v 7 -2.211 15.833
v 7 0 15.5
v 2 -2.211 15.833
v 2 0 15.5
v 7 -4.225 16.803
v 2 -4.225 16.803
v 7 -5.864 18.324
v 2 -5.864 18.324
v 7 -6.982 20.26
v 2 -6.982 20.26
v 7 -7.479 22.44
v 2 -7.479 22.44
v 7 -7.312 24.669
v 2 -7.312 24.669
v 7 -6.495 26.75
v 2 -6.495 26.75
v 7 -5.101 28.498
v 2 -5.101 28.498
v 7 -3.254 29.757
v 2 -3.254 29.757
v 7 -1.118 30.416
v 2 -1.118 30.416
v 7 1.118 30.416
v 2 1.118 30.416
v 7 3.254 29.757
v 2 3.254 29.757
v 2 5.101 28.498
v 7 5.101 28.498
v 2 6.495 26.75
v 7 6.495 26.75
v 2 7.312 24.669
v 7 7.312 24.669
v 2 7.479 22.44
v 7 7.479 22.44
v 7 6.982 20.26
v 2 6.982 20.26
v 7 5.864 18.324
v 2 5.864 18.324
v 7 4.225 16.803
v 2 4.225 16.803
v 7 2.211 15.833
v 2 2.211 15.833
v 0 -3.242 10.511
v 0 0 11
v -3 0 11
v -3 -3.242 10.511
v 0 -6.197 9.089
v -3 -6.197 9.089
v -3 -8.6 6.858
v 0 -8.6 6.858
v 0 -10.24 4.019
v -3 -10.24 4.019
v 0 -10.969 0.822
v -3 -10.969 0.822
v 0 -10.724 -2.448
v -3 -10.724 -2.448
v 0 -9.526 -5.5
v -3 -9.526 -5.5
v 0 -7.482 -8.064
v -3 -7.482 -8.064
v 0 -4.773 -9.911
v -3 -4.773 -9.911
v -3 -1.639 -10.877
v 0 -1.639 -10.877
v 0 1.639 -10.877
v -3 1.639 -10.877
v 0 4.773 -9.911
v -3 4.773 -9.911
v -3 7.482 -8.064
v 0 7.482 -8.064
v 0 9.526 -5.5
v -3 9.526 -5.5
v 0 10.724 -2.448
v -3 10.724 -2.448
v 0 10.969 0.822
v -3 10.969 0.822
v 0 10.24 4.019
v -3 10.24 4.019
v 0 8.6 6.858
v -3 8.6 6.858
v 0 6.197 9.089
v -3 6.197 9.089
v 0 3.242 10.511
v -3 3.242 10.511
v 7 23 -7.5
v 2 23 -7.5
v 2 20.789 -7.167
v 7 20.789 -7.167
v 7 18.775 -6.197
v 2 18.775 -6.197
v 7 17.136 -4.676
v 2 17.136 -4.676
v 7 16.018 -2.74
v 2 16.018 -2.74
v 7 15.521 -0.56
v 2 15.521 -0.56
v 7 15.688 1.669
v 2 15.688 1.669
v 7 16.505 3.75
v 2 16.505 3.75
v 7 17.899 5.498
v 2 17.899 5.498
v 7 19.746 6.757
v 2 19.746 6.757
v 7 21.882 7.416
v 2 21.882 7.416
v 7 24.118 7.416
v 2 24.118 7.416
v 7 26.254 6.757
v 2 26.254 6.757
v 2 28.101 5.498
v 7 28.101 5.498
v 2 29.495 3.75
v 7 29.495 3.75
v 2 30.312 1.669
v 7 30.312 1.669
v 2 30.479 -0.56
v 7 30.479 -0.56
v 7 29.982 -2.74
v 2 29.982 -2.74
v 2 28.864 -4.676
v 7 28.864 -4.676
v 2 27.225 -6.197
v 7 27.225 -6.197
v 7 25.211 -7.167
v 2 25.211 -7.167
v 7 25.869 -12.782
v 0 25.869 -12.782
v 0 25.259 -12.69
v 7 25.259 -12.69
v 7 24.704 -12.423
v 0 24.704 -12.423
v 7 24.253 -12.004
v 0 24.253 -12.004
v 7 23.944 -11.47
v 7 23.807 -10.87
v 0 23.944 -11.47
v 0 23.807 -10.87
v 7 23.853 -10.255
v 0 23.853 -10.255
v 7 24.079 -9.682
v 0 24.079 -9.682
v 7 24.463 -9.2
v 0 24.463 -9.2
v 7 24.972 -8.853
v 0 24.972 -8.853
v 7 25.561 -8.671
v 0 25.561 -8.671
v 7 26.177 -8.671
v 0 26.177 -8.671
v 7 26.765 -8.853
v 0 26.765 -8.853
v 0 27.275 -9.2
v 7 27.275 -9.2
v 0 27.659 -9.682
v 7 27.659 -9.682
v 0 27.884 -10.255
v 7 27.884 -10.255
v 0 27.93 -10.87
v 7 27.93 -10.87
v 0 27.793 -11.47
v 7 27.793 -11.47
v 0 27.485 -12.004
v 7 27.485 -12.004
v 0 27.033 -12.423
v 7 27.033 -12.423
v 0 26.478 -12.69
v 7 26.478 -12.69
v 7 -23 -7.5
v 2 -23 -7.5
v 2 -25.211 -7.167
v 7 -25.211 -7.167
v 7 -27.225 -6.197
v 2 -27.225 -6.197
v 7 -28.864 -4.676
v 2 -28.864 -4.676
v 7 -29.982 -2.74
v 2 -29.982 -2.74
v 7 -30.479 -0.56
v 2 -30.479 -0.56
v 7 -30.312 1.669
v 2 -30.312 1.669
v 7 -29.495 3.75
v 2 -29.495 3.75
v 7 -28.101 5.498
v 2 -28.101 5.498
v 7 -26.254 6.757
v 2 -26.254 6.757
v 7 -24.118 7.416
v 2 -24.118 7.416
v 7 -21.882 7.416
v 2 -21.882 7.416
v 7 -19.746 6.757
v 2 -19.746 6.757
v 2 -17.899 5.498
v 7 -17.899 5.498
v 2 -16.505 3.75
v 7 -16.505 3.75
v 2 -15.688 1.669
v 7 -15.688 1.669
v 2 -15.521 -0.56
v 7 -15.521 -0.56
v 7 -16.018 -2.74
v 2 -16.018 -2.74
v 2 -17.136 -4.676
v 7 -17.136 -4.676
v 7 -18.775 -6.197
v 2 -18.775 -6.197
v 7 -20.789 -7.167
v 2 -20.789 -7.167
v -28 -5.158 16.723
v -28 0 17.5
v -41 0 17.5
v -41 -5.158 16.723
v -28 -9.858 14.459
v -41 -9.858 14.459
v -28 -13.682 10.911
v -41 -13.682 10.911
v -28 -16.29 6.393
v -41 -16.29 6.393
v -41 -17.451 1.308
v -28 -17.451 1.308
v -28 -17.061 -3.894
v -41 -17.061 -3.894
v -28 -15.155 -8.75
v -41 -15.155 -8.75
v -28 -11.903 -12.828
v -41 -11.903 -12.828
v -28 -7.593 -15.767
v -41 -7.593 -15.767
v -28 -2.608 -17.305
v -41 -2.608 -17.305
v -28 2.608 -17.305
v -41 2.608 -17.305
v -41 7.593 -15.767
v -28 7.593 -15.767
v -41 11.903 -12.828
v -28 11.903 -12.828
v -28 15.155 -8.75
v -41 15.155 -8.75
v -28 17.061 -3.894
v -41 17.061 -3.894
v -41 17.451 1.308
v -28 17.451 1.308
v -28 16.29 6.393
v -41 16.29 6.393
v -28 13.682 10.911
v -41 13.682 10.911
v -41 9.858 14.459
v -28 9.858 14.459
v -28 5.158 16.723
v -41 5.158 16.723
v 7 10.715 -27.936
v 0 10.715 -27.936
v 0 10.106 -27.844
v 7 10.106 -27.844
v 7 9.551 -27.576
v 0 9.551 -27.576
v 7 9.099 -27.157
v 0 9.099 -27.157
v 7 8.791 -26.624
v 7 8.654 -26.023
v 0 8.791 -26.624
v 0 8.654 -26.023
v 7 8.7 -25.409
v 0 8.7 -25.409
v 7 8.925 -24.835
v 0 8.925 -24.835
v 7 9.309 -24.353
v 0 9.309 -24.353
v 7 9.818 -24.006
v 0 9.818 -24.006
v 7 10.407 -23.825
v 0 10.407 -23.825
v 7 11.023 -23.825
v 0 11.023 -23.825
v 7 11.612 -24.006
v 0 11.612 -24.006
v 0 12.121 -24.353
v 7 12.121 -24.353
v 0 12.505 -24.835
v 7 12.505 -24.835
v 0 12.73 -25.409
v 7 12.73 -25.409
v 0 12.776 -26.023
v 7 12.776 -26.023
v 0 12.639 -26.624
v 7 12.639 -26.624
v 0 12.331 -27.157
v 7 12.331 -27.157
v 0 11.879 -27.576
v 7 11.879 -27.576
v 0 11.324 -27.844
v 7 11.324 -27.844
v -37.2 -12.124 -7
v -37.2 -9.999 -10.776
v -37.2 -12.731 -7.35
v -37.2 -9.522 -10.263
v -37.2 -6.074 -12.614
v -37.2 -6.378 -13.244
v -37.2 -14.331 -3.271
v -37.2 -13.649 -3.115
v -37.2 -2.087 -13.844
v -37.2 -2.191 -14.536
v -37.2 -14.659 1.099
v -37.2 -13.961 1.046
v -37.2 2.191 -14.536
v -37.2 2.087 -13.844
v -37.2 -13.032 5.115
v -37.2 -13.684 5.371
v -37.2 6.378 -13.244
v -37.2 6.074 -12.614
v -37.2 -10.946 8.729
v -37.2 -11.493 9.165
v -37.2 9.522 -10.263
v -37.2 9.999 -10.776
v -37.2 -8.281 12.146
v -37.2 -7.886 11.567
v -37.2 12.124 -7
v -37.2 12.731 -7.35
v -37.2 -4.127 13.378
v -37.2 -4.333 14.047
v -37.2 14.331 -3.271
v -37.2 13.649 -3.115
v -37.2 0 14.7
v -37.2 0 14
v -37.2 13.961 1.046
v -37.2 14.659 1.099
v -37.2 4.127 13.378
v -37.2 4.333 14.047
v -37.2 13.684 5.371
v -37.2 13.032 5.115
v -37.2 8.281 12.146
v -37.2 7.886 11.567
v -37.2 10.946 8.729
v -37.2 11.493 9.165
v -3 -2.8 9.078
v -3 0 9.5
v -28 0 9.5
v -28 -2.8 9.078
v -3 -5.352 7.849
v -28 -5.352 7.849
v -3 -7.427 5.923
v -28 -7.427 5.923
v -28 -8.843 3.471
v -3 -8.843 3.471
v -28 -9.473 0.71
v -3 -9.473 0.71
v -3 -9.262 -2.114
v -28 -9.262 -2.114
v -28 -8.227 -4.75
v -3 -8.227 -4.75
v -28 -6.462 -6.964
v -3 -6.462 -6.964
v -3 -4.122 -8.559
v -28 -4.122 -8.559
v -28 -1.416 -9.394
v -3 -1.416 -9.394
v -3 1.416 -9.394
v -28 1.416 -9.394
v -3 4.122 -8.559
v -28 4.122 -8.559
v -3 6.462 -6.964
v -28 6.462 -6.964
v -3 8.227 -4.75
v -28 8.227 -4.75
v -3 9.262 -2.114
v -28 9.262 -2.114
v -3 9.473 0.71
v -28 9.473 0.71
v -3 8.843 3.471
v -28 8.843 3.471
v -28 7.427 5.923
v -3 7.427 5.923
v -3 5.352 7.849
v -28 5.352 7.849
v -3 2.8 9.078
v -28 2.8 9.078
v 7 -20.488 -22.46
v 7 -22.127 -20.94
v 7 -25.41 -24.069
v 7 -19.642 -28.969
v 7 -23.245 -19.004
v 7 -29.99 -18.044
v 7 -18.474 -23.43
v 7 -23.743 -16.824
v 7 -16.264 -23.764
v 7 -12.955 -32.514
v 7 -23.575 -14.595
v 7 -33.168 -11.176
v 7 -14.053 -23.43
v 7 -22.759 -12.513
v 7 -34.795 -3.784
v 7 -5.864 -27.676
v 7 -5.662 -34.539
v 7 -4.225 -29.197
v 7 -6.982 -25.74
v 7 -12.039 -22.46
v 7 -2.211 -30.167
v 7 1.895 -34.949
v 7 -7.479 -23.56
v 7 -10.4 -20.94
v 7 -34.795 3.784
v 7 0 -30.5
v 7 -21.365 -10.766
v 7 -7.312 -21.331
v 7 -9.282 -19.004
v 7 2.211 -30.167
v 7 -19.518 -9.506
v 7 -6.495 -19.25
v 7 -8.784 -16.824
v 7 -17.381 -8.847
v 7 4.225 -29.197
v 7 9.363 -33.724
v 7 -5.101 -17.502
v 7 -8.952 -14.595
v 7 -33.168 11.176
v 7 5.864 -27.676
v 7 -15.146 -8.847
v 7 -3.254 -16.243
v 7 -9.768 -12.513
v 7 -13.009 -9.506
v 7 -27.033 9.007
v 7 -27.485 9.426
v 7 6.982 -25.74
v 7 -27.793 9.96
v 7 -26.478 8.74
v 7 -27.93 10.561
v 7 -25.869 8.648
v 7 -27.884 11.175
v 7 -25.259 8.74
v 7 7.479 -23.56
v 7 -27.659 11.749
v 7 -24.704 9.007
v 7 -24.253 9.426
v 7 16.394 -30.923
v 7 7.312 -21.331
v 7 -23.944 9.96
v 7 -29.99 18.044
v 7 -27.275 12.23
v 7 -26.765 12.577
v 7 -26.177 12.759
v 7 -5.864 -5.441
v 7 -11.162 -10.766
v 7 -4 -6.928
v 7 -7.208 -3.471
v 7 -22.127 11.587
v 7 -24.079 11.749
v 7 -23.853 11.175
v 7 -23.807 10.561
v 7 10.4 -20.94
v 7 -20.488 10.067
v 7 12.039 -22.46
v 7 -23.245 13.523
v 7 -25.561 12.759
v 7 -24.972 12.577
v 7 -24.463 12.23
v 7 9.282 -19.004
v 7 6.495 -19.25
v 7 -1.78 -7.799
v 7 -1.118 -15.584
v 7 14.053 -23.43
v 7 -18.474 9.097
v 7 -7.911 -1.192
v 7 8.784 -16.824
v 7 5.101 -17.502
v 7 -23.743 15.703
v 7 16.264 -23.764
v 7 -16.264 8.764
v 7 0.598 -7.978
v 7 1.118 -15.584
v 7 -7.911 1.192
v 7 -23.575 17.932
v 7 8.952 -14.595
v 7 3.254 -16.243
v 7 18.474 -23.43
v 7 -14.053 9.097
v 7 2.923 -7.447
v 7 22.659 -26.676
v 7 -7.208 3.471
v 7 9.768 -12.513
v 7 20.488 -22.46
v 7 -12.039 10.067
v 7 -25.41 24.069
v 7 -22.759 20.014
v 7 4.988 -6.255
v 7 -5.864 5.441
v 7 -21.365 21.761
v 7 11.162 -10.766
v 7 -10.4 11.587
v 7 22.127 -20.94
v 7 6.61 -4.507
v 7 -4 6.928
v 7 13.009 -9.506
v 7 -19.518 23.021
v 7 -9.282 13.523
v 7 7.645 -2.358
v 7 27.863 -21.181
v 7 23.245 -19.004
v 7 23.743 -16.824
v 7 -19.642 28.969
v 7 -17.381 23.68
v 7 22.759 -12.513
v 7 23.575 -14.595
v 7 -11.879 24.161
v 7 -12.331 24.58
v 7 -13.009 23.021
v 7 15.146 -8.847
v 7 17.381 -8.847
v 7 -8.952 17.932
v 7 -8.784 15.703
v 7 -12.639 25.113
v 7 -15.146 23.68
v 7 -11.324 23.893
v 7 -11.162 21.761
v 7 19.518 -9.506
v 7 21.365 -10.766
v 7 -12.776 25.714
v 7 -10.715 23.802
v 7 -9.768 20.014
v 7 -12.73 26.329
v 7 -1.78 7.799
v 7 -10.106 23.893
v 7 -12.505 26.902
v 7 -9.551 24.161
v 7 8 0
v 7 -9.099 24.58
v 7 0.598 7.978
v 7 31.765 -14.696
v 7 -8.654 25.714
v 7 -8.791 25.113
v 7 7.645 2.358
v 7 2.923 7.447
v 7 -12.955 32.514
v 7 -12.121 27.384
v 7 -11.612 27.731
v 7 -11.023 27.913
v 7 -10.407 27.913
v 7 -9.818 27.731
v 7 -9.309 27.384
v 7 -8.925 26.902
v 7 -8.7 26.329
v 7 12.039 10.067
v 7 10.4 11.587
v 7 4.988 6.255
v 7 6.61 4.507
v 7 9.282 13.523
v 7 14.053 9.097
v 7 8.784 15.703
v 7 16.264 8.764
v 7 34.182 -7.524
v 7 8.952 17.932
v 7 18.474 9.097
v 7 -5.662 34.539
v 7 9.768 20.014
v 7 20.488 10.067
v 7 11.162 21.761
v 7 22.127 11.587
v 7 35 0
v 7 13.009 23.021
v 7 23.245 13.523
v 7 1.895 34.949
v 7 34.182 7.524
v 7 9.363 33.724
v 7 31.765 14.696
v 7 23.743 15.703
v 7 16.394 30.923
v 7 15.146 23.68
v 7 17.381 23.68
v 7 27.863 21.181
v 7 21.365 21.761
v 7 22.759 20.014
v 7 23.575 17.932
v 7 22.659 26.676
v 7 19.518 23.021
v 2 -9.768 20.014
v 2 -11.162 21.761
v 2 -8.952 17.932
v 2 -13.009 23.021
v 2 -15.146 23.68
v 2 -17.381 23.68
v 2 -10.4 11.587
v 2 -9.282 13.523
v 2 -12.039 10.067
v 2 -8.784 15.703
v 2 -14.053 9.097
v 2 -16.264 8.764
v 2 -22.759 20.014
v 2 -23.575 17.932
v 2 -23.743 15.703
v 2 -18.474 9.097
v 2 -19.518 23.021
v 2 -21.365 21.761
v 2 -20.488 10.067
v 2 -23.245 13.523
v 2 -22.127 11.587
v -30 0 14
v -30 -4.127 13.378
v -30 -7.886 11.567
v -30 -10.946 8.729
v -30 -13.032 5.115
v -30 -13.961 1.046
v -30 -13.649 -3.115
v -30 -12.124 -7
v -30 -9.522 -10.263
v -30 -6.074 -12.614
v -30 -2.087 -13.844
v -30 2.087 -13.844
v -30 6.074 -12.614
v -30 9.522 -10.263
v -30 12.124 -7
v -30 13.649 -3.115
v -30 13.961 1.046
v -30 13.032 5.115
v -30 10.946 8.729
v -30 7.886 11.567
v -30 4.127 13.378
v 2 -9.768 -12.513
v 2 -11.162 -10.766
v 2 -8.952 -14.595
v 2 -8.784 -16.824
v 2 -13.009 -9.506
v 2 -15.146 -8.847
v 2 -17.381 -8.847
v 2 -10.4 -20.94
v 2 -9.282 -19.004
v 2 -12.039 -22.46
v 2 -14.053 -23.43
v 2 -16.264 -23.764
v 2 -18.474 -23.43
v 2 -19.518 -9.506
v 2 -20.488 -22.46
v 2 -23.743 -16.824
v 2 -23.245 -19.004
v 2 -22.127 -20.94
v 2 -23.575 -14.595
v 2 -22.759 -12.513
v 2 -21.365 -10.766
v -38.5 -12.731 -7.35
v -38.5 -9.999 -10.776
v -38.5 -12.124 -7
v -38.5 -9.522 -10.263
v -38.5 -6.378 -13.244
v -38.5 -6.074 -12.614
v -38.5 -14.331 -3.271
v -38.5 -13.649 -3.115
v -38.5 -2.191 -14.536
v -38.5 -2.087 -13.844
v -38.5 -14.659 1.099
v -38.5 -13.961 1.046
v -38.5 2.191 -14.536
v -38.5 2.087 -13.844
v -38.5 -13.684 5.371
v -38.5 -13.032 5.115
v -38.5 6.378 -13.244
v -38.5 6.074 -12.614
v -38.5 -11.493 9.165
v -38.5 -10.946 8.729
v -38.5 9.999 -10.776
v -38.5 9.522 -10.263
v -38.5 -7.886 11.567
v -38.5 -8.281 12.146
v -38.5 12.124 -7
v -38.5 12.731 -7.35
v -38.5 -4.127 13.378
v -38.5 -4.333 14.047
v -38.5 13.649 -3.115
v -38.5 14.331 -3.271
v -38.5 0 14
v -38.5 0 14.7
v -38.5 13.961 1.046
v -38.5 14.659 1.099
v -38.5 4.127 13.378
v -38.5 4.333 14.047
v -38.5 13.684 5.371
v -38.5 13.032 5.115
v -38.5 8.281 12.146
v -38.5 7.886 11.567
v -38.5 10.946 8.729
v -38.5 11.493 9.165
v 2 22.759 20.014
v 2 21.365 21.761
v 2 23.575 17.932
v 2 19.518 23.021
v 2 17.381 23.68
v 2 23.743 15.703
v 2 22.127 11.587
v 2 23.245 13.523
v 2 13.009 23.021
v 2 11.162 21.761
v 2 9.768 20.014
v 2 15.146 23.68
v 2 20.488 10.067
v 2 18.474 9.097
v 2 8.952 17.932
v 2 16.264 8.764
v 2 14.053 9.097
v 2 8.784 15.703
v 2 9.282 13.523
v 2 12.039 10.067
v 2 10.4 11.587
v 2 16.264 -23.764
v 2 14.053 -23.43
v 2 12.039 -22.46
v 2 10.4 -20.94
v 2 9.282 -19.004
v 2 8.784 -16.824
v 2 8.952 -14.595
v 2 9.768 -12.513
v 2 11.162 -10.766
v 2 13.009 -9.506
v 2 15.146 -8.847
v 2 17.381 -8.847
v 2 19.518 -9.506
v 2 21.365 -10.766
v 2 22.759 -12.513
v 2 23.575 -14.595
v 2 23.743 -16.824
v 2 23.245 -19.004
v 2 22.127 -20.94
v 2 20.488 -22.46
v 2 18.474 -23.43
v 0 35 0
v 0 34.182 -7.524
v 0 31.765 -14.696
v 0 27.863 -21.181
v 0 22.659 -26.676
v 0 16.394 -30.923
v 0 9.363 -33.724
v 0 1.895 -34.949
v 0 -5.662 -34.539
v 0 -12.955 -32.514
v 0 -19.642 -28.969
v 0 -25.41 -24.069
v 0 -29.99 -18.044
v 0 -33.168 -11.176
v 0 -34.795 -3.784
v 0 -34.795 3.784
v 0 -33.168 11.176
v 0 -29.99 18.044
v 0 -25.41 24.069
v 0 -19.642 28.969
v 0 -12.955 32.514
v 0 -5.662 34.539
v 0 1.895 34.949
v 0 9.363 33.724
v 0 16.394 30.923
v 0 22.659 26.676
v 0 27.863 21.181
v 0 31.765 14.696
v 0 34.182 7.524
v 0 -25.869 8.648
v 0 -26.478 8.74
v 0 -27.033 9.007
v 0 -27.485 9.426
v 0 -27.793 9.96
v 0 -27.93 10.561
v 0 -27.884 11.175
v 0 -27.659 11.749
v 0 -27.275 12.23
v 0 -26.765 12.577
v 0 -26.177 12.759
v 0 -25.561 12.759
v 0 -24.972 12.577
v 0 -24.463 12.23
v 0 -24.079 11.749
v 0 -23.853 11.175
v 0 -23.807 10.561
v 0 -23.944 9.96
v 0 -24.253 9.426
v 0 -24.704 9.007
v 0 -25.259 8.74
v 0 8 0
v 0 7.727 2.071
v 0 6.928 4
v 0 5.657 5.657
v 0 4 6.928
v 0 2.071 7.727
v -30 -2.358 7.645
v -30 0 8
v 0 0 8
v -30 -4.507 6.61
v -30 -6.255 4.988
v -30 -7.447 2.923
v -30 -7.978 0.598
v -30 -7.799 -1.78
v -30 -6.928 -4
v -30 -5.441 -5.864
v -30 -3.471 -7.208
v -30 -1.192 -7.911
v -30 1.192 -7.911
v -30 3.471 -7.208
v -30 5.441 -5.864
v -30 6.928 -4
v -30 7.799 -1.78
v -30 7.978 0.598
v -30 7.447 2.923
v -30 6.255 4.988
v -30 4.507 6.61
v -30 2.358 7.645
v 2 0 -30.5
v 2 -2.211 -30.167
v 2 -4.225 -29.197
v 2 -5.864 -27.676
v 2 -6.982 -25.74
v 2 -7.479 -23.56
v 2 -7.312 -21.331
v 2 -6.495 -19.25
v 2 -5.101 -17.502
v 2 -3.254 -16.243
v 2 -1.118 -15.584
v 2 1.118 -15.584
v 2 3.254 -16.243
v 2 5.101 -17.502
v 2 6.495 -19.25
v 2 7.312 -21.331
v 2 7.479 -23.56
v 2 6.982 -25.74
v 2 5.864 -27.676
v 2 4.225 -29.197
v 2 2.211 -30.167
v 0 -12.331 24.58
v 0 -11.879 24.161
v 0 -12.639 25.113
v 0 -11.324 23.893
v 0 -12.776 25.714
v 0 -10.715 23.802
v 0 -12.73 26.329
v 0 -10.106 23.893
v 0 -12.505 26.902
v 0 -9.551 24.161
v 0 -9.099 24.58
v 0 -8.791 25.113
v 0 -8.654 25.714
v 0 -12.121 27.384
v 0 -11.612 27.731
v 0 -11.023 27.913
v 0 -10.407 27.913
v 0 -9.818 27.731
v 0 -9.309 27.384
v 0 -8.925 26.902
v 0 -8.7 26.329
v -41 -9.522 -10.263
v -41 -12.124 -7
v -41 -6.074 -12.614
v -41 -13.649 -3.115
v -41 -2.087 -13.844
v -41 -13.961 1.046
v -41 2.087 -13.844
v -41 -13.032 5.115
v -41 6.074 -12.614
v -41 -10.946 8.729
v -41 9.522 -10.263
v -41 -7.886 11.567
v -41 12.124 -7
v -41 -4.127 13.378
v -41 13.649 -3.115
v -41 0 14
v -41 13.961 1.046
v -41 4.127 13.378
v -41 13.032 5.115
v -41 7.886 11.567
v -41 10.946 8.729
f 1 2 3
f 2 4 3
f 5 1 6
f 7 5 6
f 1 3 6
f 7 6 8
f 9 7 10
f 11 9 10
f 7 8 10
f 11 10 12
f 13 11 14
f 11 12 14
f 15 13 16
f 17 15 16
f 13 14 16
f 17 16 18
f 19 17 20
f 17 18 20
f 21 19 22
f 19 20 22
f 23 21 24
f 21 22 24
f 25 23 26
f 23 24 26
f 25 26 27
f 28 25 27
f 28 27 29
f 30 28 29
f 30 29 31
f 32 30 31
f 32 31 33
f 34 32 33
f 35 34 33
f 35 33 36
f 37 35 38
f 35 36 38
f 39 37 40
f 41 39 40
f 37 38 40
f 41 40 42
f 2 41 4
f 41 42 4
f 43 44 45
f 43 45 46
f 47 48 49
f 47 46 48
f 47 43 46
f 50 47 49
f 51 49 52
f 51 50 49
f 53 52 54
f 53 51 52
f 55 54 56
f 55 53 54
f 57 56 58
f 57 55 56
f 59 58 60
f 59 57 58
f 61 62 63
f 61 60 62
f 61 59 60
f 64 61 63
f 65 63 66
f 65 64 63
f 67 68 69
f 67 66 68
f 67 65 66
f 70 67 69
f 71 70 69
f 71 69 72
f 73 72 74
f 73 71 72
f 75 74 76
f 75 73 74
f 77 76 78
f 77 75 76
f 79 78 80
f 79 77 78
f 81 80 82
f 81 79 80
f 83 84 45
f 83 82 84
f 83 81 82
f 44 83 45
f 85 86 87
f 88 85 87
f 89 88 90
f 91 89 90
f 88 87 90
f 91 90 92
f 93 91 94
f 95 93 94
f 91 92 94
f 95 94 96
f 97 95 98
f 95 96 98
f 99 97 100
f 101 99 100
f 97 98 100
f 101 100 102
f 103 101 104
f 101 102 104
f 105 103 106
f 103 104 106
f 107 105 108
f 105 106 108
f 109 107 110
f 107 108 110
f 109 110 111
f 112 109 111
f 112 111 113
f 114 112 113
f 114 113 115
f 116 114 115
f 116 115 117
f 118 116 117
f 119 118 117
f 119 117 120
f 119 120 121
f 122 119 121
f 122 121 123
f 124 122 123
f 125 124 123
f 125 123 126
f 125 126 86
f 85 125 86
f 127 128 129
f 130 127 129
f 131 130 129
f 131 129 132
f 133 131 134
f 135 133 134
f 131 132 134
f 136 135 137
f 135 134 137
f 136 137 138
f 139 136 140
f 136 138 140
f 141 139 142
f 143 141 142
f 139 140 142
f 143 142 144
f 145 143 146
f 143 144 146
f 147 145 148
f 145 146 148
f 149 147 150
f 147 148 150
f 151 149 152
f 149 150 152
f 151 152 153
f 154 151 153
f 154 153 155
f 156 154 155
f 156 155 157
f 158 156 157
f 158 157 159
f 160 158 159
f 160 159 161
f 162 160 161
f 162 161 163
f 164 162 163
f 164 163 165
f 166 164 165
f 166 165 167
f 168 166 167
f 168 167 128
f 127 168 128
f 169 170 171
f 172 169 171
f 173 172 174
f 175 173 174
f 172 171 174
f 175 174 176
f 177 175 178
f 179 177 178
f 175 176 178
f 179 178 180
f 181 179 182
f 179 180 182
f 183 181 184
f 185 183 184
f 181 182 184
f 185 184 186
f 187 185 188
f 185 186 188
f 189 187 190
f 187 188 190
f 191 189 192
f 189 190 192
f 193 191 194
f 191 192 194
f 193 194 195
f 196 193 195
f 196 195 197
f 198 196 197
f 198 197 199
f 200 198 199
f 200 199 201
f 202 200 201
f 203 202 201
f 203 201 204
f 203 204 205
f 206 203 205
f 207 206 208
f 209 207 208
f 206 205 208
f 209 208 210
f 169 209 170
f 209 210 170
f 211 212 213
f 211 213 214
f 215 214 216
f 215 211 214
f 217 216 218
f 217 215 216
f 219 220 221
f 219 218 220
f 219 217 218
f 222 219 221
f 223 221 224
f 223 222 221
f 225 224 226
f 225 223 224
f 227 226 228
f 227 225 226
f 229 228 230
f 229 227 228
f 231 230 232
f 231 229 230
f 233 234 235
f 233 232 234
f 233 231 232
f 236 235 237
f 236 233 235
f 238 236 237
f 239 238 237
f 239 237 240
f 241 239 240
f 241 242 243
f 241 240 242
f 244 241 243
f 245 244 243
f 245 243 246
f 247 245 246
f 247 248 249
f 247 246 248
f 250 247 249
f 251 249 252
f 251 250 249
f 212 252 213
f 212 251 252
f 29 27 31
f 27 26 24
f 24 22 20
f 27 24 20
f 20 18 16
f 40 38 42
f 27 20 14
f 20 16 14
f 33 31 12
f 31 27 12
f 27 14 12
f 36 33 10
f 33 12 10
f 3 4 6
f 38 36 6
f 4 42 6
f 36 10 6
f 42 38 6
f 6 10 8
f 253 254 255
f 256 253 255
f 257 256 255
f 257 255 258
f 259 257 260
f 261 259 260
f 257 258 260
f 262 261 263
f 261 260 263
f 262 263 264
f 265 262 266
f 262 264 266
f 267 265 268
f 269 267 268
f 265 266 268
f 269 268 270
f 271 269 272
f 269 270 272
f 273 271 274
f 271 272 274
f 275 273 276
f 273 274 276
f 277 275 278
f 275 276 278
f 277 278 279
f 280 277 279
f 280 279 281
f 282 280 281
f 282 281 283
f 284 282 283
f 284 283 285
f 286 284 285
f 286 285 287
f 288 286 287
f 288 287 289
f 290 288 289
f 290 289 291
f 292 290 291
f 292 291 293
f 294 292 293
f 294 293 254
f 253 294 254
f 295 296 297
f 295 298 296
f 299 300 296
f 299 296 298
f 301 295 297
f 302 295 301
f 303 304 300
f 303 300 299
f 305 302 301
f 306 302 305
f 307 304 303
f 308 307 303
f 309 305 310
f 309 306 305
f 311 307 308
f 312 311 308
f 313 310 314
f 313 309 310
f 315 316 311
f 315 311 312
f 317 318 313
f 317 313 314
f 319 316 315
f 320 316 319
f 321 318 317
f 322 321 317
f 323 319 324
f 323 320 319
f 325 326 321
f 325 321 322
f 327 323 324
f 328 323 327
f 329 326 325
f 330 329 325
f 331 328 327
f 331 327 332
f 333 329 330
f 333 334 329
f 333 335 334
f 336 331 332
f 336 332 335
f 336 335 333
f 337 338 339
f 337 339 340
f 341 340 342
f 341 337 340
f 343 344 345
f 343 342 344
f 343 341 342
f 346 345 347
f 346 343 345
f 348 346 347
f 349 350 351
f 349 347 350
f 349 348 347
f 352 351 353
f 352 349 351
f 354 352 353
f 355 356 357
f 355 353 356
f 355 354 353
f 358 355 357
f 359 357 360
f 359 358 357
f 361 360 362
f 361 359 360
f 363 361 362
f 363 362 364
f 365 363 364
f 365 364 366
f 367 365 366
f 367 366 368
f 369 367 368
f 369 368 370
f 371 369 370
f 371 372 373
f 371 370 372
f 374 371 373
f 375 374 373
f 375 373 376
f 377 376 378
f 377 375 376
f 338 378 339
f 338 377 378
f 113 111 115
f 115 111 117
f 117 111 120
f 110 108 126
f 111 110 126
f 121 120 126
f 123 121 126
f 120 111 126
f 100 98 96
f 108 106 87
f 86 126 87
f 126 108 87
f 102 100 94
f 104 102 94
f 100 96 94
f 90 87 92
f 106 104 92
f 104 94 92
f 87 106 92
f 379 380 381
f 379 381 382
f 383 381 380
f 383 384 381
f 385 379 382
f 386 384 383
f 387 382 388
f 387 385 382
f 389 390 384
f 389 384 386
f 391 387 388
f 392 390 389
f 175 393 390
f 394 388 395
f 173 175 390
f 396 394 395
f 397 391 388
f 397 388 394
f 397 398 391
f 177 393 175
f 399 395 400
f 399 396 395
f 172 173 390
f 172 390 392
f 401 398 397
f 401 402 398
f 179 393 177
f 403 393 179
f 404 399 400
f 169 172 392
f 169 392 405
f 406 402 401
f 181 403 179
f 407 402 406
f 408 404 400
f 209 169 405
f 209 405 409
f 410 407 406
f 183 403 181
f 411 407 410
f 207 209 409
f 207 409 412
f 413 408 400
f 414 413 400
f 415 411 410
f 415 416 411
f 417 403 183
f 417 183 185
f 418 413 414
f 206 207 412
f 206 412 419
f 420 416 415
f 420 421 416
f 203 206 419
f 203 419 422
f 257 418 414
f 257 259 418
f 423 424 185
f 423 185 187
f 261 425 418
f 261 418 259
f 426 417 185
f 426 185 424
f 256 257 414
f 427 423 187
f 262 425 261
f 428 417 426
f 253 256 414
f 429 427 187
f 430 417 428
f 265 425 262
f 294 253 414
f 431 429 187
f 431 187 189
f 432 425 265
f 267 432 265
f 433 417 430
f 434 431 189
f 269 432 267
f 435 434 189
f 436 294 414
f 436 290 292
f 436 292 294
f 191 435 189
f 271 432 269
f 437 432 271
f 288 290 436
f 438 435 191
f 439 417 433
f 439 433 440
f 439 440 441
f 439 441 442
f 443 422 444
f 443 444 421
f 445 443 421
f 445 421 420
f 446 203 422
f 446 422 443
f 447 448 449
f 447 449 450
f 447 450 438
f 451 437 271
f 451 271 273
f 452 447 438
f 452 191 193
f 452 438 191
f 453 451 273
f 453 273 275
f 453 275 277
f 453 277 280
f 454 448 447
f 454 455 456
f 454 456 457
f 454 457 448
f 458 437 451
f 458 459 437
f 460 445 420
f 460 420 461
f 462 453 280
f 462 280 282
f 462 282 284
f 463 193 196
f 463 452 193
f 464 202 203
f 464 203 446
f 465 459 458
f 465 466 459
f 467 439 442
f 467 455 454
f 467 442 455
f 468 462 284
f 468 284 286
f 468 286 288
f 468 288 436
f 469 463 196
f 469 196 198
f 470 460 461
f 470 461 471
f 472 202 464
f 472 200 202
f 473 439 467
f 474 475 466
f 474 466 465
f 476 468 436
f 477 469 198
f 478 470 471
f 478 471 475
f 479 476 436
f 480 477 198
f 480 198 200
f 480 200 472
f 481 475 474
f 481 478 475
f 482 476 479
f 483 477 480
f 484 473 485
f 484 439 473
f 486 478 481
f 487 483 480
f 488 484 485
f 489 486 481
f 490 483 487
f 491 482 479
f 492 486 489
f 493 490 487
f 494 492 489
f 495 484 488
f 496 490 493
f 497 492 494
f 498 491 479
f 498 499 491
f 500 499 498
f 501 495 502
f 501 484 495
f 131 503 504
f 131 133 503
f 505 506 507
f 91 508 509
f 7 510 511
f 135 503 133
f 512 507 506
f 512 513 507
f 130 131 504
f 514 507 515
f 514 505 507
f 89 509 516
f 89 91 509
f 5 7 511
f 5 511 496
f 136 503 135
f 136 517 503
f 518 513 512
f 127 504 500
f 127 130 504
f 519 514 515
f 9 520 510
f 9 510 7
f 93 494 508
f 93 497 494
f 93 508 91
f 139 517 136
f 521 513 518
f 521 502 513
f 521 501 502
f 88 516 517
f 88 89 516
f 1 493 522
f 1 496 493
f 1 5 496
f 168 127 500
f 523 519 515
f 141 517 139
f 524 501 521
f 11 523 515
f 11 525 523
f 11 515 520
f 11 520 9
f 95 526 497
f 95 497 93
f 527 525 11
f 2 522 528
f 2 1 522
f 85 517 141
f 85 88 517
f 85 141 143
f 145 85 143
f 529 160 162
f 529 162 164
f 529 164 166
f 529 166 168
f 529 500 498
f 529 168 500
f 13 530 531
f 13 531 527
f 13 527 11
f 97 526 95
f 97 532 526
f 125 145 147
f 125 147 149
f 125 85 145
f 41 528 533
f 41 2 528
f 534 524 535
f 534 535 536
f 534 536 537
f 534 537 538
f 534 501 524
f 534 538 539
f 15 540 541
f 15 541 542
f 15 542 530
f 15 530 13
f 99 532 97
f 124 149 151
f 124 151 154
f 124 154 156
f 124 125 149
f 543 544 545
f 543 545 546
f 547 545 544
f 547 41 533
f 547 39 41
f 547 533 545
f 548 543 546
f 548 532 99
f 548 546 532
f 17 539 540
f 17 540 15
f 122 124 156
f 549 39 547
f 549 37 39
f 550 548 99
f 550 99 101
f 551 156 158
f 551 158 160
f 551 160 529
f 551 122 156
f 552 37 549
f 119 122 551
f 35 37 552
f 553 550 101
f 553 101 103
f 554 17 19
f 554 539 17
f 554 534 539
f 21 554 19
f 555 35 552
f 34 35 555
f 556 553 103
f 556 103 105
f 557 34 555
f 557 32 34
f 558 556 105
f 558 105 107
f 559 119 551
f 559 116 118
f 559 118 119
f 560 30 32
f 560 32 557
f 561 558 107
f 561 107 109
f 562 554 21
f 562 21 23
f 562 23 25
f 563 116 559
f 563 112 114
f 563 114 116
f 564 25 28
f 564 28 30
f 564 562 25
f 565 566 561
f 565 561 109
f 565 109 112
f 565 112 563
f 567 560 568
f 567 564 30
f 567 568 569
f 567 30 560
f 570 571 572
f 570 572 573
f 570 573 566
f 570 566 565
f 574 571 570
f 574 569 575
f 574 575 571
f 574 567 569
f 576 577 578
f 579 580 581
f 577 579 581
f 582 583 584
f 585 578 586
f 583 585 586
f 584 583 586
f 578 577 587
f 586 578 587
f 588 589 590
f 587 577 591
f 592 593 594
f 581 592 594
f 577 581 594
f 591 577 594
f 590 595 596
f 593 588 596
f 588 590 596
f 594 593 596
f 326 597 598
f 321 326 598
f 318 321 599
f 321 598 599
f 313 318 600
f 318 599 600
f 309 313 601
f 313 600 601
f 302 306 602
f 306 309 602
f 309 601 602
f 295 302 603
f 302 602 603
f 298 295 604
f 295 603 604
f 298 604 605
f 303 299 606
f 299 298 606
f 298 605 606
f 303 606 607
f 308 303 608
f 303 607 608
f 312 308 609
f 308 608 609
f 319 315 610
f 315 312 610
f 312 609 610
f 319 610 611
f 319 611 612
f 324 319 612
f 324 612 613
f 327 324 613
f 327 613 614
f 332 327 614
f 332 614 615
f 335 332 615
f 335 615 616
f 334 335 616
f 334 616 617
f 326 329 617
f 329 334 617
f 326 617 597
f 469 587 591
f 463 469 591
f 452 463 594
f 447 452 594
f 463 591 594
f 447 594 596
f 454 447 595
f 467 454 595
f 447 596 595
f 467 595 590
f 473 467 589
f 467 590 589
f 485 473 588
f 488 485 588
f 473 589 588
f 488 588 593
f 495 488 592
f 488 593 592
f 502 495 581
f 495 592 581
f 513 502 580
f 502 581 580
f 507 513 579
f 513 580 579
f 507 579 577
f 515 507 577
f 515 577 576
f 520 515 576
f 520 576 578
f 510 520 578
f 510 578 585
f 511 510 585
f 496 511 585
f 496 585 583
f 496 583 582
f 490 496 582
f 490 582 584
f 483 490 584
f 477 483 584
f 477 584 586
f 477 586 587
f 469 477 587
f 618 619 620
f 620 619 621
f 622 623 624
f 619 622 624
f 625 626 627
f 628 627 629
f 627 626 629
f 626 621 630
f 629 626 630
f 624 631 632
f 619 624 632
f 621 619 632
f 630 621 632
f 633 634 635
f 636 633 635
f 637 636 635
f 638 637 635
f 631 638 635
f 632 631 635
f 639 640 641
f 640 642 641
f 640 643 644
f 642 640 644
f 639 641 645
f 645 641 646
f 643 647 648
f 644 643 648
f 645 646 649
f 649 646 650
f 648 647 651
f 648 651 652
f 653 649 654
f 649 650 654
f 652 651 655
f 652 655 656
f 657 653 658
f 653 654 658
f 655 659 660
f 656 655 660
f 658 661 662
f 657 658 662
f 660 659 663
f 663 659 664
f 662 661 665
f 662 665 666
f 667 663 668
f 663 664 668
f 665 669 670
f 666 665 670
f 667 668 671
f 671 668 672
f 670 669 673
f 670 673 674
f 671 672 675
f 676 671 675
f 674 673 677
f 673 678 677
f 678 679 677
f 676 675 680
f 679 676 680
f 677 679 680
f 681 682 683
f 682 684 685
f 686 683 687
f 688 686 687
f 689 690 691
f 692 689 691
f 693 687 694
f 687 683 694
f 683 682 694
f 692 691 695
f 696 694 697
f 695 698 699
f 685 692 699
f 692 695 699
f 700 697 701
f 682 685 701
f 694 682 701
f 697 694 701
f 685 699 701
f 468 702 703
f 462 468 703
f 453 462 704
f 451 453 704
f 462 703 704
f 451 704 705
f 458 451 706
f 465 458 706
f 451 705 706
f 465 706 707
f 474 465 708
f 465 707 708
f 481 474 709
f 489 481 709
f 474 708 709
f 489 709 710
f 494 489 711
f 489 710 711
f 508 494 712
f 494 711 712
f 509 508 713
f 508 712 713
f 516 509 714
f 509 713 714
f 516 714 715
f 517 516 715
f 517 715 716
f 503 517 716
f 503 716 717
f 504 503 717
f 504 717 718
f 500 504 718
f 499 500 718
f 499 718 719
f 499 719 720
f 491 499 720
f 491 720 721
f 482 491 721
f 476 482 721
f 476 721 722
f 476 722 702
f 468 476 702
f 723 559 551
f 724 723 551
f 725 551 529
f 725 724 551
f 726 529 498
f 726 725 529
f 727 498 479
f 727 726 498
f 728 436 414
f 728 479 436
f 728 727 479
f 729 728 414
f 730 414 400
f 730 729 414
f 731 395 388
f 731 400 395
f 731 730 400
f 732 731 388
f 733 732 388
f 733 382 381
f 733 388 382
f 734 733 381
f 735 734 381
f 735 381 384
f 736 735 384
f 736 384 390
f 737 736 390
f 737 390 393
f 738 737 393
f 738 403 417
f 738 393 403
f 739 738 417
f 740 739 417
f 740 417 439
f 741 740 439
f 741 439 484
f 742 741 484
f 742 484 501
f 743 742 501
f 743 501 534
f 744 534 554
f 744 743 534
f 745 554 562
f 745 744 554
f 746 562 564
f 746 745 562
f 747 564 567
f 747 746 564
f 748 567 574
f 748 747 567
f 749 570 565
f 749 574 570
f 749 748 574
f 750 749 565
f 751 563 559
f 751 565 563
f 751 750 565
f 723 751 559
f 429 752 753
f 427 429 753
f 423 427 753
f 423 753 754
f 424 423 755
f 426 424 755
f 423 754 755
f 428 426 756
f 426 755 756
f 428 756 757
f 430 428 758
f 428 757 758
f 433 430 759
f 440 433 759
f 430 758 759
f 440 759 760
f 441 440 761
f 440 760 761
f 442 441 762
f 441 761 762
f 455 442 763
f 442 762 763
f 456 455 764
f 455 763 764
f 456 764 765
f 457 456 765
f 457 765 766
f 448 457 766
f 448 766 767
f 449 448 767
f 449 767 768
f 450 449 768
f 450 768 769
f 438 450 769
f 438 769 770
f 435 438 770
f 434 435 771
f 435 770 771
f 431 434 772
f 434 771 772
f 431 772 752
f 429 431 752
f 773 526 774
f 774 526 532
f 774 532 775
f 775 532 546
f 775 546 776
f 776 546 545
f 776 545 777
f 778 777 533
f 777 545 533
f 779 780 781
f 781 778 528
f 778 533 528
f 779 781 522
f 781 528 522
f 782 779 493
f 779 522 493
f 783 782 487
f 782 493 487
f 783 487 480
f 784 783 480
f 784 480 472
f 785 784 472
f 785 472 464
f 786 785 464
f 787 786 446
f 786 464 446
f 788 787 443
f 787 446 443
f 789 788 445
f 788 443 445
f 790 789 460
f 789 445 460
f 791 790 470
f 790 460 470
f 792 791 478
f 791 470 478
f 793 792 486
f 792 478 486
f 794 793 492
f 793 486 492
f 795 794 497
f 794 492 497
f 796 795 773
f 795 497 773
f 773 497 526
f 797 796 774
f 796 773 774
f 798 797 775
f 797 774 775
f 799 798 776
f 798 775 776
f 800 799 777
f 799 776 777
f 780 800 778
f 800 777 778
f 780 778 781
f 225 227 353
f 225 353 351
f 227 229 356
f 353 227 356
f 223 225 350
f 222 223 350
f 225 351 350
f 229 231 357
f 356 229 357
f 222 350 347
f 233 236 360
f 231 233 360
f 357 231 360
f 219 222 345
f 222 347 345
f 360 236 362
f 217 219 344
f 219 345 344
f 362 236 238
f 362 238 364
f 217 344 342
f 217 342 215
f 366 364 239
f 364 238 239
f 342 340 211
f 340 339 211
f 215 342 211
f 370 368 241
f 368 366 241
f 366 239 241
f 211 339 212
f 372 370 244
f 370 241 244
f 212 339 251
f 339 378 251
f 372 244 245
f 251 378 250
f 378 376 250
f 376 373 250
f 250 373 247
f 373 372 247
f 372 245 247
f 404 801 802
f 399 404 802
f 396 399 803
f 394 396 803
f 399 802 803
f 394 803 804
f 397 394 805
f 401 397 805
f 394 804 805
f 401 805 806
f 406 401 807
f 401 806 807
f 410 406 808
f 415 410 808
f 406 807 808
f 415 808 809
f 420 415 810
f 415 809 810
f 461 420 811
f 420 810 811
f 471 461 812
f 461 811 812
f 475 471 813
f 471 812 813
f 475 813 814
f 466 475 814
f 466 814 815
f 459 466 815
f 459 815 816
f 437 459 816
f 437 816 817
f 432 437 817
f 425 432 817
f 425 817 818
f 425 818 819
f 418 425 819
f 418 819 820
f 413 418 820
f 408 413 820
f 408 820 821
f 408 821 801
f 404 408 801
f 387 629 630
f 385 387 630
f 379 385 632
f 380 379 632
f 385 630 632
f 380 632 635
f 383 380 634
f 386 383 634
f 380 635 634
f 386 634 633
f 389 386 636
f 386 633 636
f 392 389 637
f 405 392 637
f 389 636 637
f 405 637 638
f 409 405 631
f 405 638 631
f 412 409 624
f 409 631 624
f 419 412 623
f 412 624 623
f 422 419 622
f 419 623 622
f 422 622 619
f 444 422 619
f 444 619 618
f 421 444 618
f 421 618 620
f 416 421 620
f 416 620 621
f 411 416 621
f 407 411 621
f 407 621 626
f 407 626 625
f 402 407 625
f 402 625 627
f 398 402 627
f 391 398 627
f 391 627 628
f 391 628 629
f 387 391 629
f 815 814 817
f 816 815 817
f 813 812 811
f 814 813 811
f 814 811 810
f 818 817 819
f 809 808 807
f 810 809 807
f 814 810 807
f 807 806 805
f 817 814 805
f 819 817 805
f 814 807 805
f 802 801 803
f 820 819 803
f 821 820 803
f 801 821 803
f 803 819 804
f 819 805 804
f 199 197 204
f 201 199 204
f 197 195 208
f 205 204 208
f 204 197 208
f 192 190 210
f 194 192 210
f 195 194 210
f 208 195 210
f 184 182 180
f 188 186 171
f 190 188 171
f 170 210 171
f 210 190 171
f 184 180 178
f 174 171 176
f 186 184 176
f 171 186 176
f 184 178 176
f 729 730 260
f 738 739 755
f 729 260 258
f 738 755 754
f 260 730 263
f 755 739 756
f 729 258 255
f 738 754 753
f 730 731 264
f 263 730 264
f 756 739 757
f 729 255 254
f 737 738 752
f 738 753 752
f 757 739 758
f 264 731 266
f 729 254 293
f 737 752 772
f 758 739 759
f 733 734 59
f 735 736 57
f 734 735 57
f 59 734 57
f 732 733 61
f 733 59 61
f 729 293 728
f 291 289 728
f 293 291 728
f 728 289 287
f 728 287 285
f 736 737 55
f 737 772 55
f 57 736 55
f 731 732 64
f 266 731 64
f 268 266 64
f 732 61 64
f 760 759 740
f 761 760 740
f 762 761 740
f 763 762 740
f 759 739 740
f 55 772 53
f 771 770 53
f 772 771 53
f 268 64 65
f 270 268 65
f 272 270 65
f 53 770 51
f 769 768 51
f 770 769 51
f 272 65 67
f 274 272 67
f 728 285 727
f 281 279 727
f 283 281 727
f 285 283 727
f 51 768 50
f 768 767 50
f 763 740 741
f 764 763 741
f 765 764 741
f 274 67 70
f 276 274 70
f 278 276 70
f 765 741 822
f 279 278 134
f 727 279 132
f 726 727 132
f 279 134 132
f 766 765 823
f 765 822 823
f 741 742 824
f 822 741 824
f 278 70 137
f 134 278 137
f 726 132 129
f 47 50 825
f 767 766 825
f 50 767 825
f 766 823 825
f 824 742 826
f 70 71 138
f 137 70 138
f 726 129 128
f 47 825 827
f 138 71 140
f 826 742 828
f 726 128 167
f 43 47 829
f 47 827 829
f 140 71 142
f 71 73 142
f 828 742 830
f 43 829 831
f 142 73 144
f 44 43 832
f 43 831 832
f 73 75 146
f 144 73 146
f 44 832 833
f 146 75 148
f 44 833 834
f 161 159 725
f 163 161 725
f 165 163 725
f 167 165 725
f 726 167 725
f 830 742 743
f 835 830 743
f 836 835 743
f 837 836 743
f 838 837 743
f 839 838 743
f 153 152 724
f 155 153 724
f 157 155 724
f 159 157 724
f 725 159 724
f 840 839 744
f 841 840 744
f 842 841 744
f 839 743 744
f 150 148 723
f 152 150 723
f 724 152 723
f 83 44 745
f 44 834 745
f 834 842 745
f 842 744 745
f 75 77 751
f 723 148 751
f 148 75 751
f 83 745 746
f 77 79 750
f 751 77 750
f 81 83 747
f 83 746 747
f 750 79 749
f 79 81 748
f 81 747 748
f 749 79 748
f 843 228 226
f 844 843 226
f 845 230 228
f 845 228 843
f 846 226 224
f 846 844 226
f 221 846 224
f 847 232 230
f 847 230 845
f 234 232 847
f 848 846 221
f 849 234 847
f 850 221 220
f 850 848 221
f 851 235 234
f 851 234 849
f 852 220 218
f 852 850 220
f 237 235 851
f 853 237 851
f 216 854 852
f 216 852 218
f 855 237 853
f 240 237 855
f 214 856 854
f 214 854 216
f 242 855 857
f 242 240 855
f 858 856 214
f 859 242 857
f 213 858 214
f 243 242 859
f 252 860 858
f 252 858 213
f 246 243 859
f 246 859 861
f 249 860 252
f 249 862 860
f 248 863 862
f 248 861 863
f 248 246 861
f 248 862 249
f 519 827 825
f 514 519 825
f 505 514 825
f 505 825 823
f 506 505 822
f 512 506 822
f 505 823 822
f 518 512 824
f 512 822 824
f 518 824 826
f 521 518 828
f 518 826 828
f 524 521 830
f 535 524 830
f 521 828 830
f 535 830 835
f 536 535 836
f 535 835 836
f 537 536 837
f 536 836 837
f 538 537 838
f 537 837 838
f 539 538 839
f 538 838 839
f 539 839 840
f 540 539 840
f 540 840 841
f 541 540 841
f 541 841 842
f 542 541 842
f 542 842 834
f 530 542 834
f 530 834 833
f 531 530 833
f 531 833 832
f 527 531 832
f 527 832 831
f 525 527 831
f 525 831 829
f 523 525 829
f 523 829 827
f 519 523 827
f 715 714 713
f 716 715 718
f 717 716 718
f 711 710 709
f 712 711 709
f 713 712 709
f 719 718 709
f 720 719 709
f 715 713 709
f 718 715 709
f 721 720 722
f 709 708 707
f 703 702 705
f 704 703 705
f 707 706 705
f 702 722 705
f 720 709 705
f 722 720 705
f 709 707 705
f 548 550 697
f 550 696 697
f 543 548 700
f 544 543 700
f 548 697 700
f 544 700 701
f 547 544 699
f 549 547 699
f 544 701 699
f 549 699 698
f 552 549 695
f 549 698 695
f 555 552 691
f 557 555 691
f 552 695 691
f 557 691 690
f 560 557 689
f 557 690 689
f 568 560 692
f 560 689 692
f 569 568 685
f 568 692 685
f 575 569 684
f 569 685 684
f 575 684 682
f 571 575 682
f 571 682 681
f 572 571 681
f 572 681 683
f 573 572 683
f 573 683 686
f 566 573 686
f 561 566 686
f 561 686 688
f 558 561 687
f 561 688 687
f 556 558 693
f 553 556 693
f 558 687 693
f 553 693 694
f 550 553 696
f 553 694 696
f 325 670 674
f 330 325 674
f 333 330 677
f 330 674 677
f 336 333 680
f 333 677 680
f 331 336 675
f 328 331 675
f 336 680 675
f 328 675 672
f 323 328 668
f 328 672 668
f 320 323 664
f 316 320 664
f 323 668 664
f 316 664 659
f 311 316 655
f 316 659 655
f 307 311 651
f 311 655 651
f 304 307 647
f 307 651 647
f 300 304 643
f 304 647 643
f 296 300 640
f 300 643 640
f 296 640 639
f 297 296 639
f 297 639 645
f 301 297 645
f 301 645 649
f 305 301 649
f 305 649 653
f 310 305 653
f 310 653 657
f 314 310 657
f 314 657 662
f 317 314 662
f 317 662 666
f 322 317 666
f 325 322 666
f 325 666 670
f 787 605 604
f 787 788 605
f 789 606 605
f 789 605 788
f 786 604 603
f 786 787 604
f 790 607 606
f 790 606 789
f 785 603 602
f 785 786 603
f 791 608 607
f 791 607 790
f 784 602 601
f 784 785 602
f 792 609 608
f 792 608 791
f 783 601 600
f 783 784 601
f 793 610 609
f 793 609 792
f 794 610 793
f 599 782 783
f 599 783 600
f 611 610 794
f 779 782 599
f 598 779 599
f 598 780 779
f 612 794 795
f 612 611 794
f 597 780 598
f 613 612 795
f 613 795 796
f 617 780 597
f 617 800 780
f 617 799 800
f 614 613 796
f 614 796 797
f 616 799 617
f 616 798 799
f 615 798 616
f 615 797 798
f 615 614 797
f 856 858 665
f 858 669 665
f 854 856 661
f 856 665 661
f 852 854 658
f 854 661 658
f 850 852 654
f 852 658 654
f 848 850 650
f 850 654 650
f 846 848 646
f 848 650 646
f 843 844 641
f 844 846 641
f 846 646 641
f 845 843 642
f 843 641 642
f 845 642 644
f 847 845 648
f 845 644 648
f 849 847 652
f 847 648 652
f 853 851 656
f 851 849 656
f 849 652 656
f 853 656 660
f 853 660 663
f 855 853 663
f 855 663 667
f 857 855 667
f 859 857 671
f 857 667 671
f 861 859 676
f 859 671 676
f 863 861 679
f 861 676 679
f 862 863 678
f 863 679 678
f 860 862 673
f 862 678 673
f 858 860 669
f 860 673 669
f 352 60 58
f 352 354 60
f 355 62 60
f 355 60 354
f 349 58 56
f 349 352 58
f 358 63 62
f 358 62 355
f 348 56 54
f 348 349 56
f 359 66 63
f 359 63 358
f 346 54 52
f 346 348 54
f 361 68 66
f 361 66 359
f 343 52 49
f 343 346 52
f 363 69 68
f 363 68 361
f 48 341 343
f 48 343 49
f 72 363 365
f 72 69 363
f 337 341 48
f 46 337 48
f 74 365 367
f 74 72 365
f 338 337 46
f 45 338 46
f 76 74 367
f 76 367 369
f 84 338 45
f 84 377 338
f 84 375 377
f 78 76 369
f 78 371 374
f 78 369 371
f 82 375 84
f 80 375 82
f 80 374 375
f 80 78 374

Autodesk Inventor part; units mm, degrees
ref_plane "YZ Plane" through (0, 0, 0) normal (1, 0, 0) x (0, 1, 0)
ref_plane "XZ Plane" through (0, 0, 0) normal (0, 1, 0) x (-1, 0, 0)
sketch "Sketch1" plane through (0, 0, 0) normal (1, 0, 0) x (0, 1, 0)
  circle A0 centre (0, 0) radius 35
  circle A1 centre (0, 0) radius 8
  dimension "d0" = 70
  dimension "d1" = 16
extrude "Extrusion1" add sketch "Sketch1" along normal blind 7
sketch "Sketch2" plane through (7, 0, 0) normal (1, 0, 0) x (0, 0, -1)
  circle A0 centre (0, 0) radius 23 construction
  point P0 (-23, 0)
  point P1 (-16.2635, -16.2635)
  point P2 (0, -23)
  point P3 (16.2635, -16.2635)
  point P4 (23, 0)
  point P5 (16.2635, 16.2635)
  point P6 (0, 23)
  point P7 (-16.2635, 16.2635)
  dimension "d4" = 46
  dimension "d5" = 0
  dimension "d8" = 360
hole "Hole1" at (7, 0, 23) at (7, -16.2635, 16.2635) at (7, -23, 0) at (7, -16.2635, -16.2635) at (7, 0, -23) at (7, 16.2635, -16.2635) at (7, 23, 0) at (7, 16.2635, 16.2635) direction (-1, 0, 0) diameter 15 depth 5
sketch "Sketch3" plane through (0, 0, 0) normal (-1, 0, 0) x (0, 0, 1)
  circle A0 centre (0, 0) radius 35 projected
  circle A1 centre (0, 0) radius 8 projected
  circle A2 centre (0, 0) radius 9.5
  dimension "d17" = 19
extrude "Extrusion2" add sketch "Sketch3" along normal blind 28 contours A2
sketch "Sketch4" plane through (0, 0, 0) normal (-1, 0, 0) x (0, 0, 1)
  circle A0 centre (0, 0) radius 11
  circle A1 centre (0, 0) radius 9.5 projected
  dimension "d20" = 22
extrude "Extrusion3" add sketch "Sketch4" along normal blind 3
sketch "Sketch5" plane through (-28, 0, 0) normal (-1, 0, 0) x (0, 0, 1)
  circle A0 centre (0, 0) radius 17.5
  circle A1 centre (0, 0) radius 8 projected
  dimension "d23" = 35
extrude "Extrusion4" add sketch "Sketch5" along normal blind 2
sketch "Sketch6" plane through (-30, 0, 0) normal (-1, 0, 0) x (0, 0, 1)
  circle A0 centre (0, 0) radius 17.5
  circle A1 centre (0, 0) radius 8 projected
  circle A2 centre (0, 0) radius 14
  dimension "d26" = 28
  dimension "d27" = 35
extrude "Extrusion5" add sketch "Sketch6" along normal blind 11 contours A0
ref_plane "Work Plane1" through (-38.5, 0, 0) normal (-1, 0, 0) x (0, 0, 1)
sketch "Sketch7" plane through (-38.5, 0, 0) normal (-1, 0, 0) x (0, 0, 1)
  circle A0 centre (0, 0) radius 14 projected
  circle A1 centre (0, 0) radius 14.7
  dimension "d31" = 29.4
extrude "Extrusion6" cut sketch "Sketch7" against normal blind 1.3
sketch "Sketch12" plane through (7, 0, 0) normal (1, 0, 0) x (0, 0, -1)
  circle A0 centre (0, 23) radius 7.5 projected
  circle A1 centre (23, 0) radius 7.5 projected
  circle A2 centre (0, -23) radius 7.5 projected
  circle A3 centre (-23, 0) radius 7.5 projected
  circle A4 centre (-16.2635, -16.2635) radius 7.5 projected
  circle A5 centre (16.2635, -16.2635) radius 7.5 projected
  circle A6 centre (16.2635, 16.2635) radius 7.5 projected
  circle A7 centre (-16.2635, 16.2635) radius 7.5 projected
  circle A8 centre (0, 0) radius 35 projected
  circle A9 centre (0, 0) radius 8 projected
  circle A10 centre (0, 0) radius 28 construction
  line L0 (-16.2635, 16.2635) -> (16.2635, -16.2635) construction
  line L1 (0, 0) -> (0, 23)
  line L2 (0, 0) -> (10.7151, 25.8686)
  line L3 (0, 0) -> (25.8686, 10.7151)
  point P0 (-25.8686, -10.7151)
  point P1 (-10.7151, -25.8686)
  dimension "d41" = 56
  dimension "d42" = 22.5
  dimension "d43" = 45
hole "Hole3" at (7, 25.8686, -10.7151) at (7, 10.7151, -25.8686) at (7, -25.8686, 10.7151) at (7, -10.7151, 25.8686) direction (-1, 0, 0) diameter 4.134 depth 14.2 tip angle 118 thread size "M5x0.8" class "6H" standard "ANSI Metric M Profile"
sketch "Sketch13" plane through (7, 0, 0) normal (1, 0, 0) x (0, 0, -1)
  circle A0 centre (10.7151, 25.8686) radius 2.067 projected
  circle A1 centre (25.8686, 10.7151) radius 2.067 projected
  line L0 (10.7151, 25.8686) -> (25.8686, 10.7151)
  point P0 (0, 0)
properties part number "P411" material "Aluminum 6061"
